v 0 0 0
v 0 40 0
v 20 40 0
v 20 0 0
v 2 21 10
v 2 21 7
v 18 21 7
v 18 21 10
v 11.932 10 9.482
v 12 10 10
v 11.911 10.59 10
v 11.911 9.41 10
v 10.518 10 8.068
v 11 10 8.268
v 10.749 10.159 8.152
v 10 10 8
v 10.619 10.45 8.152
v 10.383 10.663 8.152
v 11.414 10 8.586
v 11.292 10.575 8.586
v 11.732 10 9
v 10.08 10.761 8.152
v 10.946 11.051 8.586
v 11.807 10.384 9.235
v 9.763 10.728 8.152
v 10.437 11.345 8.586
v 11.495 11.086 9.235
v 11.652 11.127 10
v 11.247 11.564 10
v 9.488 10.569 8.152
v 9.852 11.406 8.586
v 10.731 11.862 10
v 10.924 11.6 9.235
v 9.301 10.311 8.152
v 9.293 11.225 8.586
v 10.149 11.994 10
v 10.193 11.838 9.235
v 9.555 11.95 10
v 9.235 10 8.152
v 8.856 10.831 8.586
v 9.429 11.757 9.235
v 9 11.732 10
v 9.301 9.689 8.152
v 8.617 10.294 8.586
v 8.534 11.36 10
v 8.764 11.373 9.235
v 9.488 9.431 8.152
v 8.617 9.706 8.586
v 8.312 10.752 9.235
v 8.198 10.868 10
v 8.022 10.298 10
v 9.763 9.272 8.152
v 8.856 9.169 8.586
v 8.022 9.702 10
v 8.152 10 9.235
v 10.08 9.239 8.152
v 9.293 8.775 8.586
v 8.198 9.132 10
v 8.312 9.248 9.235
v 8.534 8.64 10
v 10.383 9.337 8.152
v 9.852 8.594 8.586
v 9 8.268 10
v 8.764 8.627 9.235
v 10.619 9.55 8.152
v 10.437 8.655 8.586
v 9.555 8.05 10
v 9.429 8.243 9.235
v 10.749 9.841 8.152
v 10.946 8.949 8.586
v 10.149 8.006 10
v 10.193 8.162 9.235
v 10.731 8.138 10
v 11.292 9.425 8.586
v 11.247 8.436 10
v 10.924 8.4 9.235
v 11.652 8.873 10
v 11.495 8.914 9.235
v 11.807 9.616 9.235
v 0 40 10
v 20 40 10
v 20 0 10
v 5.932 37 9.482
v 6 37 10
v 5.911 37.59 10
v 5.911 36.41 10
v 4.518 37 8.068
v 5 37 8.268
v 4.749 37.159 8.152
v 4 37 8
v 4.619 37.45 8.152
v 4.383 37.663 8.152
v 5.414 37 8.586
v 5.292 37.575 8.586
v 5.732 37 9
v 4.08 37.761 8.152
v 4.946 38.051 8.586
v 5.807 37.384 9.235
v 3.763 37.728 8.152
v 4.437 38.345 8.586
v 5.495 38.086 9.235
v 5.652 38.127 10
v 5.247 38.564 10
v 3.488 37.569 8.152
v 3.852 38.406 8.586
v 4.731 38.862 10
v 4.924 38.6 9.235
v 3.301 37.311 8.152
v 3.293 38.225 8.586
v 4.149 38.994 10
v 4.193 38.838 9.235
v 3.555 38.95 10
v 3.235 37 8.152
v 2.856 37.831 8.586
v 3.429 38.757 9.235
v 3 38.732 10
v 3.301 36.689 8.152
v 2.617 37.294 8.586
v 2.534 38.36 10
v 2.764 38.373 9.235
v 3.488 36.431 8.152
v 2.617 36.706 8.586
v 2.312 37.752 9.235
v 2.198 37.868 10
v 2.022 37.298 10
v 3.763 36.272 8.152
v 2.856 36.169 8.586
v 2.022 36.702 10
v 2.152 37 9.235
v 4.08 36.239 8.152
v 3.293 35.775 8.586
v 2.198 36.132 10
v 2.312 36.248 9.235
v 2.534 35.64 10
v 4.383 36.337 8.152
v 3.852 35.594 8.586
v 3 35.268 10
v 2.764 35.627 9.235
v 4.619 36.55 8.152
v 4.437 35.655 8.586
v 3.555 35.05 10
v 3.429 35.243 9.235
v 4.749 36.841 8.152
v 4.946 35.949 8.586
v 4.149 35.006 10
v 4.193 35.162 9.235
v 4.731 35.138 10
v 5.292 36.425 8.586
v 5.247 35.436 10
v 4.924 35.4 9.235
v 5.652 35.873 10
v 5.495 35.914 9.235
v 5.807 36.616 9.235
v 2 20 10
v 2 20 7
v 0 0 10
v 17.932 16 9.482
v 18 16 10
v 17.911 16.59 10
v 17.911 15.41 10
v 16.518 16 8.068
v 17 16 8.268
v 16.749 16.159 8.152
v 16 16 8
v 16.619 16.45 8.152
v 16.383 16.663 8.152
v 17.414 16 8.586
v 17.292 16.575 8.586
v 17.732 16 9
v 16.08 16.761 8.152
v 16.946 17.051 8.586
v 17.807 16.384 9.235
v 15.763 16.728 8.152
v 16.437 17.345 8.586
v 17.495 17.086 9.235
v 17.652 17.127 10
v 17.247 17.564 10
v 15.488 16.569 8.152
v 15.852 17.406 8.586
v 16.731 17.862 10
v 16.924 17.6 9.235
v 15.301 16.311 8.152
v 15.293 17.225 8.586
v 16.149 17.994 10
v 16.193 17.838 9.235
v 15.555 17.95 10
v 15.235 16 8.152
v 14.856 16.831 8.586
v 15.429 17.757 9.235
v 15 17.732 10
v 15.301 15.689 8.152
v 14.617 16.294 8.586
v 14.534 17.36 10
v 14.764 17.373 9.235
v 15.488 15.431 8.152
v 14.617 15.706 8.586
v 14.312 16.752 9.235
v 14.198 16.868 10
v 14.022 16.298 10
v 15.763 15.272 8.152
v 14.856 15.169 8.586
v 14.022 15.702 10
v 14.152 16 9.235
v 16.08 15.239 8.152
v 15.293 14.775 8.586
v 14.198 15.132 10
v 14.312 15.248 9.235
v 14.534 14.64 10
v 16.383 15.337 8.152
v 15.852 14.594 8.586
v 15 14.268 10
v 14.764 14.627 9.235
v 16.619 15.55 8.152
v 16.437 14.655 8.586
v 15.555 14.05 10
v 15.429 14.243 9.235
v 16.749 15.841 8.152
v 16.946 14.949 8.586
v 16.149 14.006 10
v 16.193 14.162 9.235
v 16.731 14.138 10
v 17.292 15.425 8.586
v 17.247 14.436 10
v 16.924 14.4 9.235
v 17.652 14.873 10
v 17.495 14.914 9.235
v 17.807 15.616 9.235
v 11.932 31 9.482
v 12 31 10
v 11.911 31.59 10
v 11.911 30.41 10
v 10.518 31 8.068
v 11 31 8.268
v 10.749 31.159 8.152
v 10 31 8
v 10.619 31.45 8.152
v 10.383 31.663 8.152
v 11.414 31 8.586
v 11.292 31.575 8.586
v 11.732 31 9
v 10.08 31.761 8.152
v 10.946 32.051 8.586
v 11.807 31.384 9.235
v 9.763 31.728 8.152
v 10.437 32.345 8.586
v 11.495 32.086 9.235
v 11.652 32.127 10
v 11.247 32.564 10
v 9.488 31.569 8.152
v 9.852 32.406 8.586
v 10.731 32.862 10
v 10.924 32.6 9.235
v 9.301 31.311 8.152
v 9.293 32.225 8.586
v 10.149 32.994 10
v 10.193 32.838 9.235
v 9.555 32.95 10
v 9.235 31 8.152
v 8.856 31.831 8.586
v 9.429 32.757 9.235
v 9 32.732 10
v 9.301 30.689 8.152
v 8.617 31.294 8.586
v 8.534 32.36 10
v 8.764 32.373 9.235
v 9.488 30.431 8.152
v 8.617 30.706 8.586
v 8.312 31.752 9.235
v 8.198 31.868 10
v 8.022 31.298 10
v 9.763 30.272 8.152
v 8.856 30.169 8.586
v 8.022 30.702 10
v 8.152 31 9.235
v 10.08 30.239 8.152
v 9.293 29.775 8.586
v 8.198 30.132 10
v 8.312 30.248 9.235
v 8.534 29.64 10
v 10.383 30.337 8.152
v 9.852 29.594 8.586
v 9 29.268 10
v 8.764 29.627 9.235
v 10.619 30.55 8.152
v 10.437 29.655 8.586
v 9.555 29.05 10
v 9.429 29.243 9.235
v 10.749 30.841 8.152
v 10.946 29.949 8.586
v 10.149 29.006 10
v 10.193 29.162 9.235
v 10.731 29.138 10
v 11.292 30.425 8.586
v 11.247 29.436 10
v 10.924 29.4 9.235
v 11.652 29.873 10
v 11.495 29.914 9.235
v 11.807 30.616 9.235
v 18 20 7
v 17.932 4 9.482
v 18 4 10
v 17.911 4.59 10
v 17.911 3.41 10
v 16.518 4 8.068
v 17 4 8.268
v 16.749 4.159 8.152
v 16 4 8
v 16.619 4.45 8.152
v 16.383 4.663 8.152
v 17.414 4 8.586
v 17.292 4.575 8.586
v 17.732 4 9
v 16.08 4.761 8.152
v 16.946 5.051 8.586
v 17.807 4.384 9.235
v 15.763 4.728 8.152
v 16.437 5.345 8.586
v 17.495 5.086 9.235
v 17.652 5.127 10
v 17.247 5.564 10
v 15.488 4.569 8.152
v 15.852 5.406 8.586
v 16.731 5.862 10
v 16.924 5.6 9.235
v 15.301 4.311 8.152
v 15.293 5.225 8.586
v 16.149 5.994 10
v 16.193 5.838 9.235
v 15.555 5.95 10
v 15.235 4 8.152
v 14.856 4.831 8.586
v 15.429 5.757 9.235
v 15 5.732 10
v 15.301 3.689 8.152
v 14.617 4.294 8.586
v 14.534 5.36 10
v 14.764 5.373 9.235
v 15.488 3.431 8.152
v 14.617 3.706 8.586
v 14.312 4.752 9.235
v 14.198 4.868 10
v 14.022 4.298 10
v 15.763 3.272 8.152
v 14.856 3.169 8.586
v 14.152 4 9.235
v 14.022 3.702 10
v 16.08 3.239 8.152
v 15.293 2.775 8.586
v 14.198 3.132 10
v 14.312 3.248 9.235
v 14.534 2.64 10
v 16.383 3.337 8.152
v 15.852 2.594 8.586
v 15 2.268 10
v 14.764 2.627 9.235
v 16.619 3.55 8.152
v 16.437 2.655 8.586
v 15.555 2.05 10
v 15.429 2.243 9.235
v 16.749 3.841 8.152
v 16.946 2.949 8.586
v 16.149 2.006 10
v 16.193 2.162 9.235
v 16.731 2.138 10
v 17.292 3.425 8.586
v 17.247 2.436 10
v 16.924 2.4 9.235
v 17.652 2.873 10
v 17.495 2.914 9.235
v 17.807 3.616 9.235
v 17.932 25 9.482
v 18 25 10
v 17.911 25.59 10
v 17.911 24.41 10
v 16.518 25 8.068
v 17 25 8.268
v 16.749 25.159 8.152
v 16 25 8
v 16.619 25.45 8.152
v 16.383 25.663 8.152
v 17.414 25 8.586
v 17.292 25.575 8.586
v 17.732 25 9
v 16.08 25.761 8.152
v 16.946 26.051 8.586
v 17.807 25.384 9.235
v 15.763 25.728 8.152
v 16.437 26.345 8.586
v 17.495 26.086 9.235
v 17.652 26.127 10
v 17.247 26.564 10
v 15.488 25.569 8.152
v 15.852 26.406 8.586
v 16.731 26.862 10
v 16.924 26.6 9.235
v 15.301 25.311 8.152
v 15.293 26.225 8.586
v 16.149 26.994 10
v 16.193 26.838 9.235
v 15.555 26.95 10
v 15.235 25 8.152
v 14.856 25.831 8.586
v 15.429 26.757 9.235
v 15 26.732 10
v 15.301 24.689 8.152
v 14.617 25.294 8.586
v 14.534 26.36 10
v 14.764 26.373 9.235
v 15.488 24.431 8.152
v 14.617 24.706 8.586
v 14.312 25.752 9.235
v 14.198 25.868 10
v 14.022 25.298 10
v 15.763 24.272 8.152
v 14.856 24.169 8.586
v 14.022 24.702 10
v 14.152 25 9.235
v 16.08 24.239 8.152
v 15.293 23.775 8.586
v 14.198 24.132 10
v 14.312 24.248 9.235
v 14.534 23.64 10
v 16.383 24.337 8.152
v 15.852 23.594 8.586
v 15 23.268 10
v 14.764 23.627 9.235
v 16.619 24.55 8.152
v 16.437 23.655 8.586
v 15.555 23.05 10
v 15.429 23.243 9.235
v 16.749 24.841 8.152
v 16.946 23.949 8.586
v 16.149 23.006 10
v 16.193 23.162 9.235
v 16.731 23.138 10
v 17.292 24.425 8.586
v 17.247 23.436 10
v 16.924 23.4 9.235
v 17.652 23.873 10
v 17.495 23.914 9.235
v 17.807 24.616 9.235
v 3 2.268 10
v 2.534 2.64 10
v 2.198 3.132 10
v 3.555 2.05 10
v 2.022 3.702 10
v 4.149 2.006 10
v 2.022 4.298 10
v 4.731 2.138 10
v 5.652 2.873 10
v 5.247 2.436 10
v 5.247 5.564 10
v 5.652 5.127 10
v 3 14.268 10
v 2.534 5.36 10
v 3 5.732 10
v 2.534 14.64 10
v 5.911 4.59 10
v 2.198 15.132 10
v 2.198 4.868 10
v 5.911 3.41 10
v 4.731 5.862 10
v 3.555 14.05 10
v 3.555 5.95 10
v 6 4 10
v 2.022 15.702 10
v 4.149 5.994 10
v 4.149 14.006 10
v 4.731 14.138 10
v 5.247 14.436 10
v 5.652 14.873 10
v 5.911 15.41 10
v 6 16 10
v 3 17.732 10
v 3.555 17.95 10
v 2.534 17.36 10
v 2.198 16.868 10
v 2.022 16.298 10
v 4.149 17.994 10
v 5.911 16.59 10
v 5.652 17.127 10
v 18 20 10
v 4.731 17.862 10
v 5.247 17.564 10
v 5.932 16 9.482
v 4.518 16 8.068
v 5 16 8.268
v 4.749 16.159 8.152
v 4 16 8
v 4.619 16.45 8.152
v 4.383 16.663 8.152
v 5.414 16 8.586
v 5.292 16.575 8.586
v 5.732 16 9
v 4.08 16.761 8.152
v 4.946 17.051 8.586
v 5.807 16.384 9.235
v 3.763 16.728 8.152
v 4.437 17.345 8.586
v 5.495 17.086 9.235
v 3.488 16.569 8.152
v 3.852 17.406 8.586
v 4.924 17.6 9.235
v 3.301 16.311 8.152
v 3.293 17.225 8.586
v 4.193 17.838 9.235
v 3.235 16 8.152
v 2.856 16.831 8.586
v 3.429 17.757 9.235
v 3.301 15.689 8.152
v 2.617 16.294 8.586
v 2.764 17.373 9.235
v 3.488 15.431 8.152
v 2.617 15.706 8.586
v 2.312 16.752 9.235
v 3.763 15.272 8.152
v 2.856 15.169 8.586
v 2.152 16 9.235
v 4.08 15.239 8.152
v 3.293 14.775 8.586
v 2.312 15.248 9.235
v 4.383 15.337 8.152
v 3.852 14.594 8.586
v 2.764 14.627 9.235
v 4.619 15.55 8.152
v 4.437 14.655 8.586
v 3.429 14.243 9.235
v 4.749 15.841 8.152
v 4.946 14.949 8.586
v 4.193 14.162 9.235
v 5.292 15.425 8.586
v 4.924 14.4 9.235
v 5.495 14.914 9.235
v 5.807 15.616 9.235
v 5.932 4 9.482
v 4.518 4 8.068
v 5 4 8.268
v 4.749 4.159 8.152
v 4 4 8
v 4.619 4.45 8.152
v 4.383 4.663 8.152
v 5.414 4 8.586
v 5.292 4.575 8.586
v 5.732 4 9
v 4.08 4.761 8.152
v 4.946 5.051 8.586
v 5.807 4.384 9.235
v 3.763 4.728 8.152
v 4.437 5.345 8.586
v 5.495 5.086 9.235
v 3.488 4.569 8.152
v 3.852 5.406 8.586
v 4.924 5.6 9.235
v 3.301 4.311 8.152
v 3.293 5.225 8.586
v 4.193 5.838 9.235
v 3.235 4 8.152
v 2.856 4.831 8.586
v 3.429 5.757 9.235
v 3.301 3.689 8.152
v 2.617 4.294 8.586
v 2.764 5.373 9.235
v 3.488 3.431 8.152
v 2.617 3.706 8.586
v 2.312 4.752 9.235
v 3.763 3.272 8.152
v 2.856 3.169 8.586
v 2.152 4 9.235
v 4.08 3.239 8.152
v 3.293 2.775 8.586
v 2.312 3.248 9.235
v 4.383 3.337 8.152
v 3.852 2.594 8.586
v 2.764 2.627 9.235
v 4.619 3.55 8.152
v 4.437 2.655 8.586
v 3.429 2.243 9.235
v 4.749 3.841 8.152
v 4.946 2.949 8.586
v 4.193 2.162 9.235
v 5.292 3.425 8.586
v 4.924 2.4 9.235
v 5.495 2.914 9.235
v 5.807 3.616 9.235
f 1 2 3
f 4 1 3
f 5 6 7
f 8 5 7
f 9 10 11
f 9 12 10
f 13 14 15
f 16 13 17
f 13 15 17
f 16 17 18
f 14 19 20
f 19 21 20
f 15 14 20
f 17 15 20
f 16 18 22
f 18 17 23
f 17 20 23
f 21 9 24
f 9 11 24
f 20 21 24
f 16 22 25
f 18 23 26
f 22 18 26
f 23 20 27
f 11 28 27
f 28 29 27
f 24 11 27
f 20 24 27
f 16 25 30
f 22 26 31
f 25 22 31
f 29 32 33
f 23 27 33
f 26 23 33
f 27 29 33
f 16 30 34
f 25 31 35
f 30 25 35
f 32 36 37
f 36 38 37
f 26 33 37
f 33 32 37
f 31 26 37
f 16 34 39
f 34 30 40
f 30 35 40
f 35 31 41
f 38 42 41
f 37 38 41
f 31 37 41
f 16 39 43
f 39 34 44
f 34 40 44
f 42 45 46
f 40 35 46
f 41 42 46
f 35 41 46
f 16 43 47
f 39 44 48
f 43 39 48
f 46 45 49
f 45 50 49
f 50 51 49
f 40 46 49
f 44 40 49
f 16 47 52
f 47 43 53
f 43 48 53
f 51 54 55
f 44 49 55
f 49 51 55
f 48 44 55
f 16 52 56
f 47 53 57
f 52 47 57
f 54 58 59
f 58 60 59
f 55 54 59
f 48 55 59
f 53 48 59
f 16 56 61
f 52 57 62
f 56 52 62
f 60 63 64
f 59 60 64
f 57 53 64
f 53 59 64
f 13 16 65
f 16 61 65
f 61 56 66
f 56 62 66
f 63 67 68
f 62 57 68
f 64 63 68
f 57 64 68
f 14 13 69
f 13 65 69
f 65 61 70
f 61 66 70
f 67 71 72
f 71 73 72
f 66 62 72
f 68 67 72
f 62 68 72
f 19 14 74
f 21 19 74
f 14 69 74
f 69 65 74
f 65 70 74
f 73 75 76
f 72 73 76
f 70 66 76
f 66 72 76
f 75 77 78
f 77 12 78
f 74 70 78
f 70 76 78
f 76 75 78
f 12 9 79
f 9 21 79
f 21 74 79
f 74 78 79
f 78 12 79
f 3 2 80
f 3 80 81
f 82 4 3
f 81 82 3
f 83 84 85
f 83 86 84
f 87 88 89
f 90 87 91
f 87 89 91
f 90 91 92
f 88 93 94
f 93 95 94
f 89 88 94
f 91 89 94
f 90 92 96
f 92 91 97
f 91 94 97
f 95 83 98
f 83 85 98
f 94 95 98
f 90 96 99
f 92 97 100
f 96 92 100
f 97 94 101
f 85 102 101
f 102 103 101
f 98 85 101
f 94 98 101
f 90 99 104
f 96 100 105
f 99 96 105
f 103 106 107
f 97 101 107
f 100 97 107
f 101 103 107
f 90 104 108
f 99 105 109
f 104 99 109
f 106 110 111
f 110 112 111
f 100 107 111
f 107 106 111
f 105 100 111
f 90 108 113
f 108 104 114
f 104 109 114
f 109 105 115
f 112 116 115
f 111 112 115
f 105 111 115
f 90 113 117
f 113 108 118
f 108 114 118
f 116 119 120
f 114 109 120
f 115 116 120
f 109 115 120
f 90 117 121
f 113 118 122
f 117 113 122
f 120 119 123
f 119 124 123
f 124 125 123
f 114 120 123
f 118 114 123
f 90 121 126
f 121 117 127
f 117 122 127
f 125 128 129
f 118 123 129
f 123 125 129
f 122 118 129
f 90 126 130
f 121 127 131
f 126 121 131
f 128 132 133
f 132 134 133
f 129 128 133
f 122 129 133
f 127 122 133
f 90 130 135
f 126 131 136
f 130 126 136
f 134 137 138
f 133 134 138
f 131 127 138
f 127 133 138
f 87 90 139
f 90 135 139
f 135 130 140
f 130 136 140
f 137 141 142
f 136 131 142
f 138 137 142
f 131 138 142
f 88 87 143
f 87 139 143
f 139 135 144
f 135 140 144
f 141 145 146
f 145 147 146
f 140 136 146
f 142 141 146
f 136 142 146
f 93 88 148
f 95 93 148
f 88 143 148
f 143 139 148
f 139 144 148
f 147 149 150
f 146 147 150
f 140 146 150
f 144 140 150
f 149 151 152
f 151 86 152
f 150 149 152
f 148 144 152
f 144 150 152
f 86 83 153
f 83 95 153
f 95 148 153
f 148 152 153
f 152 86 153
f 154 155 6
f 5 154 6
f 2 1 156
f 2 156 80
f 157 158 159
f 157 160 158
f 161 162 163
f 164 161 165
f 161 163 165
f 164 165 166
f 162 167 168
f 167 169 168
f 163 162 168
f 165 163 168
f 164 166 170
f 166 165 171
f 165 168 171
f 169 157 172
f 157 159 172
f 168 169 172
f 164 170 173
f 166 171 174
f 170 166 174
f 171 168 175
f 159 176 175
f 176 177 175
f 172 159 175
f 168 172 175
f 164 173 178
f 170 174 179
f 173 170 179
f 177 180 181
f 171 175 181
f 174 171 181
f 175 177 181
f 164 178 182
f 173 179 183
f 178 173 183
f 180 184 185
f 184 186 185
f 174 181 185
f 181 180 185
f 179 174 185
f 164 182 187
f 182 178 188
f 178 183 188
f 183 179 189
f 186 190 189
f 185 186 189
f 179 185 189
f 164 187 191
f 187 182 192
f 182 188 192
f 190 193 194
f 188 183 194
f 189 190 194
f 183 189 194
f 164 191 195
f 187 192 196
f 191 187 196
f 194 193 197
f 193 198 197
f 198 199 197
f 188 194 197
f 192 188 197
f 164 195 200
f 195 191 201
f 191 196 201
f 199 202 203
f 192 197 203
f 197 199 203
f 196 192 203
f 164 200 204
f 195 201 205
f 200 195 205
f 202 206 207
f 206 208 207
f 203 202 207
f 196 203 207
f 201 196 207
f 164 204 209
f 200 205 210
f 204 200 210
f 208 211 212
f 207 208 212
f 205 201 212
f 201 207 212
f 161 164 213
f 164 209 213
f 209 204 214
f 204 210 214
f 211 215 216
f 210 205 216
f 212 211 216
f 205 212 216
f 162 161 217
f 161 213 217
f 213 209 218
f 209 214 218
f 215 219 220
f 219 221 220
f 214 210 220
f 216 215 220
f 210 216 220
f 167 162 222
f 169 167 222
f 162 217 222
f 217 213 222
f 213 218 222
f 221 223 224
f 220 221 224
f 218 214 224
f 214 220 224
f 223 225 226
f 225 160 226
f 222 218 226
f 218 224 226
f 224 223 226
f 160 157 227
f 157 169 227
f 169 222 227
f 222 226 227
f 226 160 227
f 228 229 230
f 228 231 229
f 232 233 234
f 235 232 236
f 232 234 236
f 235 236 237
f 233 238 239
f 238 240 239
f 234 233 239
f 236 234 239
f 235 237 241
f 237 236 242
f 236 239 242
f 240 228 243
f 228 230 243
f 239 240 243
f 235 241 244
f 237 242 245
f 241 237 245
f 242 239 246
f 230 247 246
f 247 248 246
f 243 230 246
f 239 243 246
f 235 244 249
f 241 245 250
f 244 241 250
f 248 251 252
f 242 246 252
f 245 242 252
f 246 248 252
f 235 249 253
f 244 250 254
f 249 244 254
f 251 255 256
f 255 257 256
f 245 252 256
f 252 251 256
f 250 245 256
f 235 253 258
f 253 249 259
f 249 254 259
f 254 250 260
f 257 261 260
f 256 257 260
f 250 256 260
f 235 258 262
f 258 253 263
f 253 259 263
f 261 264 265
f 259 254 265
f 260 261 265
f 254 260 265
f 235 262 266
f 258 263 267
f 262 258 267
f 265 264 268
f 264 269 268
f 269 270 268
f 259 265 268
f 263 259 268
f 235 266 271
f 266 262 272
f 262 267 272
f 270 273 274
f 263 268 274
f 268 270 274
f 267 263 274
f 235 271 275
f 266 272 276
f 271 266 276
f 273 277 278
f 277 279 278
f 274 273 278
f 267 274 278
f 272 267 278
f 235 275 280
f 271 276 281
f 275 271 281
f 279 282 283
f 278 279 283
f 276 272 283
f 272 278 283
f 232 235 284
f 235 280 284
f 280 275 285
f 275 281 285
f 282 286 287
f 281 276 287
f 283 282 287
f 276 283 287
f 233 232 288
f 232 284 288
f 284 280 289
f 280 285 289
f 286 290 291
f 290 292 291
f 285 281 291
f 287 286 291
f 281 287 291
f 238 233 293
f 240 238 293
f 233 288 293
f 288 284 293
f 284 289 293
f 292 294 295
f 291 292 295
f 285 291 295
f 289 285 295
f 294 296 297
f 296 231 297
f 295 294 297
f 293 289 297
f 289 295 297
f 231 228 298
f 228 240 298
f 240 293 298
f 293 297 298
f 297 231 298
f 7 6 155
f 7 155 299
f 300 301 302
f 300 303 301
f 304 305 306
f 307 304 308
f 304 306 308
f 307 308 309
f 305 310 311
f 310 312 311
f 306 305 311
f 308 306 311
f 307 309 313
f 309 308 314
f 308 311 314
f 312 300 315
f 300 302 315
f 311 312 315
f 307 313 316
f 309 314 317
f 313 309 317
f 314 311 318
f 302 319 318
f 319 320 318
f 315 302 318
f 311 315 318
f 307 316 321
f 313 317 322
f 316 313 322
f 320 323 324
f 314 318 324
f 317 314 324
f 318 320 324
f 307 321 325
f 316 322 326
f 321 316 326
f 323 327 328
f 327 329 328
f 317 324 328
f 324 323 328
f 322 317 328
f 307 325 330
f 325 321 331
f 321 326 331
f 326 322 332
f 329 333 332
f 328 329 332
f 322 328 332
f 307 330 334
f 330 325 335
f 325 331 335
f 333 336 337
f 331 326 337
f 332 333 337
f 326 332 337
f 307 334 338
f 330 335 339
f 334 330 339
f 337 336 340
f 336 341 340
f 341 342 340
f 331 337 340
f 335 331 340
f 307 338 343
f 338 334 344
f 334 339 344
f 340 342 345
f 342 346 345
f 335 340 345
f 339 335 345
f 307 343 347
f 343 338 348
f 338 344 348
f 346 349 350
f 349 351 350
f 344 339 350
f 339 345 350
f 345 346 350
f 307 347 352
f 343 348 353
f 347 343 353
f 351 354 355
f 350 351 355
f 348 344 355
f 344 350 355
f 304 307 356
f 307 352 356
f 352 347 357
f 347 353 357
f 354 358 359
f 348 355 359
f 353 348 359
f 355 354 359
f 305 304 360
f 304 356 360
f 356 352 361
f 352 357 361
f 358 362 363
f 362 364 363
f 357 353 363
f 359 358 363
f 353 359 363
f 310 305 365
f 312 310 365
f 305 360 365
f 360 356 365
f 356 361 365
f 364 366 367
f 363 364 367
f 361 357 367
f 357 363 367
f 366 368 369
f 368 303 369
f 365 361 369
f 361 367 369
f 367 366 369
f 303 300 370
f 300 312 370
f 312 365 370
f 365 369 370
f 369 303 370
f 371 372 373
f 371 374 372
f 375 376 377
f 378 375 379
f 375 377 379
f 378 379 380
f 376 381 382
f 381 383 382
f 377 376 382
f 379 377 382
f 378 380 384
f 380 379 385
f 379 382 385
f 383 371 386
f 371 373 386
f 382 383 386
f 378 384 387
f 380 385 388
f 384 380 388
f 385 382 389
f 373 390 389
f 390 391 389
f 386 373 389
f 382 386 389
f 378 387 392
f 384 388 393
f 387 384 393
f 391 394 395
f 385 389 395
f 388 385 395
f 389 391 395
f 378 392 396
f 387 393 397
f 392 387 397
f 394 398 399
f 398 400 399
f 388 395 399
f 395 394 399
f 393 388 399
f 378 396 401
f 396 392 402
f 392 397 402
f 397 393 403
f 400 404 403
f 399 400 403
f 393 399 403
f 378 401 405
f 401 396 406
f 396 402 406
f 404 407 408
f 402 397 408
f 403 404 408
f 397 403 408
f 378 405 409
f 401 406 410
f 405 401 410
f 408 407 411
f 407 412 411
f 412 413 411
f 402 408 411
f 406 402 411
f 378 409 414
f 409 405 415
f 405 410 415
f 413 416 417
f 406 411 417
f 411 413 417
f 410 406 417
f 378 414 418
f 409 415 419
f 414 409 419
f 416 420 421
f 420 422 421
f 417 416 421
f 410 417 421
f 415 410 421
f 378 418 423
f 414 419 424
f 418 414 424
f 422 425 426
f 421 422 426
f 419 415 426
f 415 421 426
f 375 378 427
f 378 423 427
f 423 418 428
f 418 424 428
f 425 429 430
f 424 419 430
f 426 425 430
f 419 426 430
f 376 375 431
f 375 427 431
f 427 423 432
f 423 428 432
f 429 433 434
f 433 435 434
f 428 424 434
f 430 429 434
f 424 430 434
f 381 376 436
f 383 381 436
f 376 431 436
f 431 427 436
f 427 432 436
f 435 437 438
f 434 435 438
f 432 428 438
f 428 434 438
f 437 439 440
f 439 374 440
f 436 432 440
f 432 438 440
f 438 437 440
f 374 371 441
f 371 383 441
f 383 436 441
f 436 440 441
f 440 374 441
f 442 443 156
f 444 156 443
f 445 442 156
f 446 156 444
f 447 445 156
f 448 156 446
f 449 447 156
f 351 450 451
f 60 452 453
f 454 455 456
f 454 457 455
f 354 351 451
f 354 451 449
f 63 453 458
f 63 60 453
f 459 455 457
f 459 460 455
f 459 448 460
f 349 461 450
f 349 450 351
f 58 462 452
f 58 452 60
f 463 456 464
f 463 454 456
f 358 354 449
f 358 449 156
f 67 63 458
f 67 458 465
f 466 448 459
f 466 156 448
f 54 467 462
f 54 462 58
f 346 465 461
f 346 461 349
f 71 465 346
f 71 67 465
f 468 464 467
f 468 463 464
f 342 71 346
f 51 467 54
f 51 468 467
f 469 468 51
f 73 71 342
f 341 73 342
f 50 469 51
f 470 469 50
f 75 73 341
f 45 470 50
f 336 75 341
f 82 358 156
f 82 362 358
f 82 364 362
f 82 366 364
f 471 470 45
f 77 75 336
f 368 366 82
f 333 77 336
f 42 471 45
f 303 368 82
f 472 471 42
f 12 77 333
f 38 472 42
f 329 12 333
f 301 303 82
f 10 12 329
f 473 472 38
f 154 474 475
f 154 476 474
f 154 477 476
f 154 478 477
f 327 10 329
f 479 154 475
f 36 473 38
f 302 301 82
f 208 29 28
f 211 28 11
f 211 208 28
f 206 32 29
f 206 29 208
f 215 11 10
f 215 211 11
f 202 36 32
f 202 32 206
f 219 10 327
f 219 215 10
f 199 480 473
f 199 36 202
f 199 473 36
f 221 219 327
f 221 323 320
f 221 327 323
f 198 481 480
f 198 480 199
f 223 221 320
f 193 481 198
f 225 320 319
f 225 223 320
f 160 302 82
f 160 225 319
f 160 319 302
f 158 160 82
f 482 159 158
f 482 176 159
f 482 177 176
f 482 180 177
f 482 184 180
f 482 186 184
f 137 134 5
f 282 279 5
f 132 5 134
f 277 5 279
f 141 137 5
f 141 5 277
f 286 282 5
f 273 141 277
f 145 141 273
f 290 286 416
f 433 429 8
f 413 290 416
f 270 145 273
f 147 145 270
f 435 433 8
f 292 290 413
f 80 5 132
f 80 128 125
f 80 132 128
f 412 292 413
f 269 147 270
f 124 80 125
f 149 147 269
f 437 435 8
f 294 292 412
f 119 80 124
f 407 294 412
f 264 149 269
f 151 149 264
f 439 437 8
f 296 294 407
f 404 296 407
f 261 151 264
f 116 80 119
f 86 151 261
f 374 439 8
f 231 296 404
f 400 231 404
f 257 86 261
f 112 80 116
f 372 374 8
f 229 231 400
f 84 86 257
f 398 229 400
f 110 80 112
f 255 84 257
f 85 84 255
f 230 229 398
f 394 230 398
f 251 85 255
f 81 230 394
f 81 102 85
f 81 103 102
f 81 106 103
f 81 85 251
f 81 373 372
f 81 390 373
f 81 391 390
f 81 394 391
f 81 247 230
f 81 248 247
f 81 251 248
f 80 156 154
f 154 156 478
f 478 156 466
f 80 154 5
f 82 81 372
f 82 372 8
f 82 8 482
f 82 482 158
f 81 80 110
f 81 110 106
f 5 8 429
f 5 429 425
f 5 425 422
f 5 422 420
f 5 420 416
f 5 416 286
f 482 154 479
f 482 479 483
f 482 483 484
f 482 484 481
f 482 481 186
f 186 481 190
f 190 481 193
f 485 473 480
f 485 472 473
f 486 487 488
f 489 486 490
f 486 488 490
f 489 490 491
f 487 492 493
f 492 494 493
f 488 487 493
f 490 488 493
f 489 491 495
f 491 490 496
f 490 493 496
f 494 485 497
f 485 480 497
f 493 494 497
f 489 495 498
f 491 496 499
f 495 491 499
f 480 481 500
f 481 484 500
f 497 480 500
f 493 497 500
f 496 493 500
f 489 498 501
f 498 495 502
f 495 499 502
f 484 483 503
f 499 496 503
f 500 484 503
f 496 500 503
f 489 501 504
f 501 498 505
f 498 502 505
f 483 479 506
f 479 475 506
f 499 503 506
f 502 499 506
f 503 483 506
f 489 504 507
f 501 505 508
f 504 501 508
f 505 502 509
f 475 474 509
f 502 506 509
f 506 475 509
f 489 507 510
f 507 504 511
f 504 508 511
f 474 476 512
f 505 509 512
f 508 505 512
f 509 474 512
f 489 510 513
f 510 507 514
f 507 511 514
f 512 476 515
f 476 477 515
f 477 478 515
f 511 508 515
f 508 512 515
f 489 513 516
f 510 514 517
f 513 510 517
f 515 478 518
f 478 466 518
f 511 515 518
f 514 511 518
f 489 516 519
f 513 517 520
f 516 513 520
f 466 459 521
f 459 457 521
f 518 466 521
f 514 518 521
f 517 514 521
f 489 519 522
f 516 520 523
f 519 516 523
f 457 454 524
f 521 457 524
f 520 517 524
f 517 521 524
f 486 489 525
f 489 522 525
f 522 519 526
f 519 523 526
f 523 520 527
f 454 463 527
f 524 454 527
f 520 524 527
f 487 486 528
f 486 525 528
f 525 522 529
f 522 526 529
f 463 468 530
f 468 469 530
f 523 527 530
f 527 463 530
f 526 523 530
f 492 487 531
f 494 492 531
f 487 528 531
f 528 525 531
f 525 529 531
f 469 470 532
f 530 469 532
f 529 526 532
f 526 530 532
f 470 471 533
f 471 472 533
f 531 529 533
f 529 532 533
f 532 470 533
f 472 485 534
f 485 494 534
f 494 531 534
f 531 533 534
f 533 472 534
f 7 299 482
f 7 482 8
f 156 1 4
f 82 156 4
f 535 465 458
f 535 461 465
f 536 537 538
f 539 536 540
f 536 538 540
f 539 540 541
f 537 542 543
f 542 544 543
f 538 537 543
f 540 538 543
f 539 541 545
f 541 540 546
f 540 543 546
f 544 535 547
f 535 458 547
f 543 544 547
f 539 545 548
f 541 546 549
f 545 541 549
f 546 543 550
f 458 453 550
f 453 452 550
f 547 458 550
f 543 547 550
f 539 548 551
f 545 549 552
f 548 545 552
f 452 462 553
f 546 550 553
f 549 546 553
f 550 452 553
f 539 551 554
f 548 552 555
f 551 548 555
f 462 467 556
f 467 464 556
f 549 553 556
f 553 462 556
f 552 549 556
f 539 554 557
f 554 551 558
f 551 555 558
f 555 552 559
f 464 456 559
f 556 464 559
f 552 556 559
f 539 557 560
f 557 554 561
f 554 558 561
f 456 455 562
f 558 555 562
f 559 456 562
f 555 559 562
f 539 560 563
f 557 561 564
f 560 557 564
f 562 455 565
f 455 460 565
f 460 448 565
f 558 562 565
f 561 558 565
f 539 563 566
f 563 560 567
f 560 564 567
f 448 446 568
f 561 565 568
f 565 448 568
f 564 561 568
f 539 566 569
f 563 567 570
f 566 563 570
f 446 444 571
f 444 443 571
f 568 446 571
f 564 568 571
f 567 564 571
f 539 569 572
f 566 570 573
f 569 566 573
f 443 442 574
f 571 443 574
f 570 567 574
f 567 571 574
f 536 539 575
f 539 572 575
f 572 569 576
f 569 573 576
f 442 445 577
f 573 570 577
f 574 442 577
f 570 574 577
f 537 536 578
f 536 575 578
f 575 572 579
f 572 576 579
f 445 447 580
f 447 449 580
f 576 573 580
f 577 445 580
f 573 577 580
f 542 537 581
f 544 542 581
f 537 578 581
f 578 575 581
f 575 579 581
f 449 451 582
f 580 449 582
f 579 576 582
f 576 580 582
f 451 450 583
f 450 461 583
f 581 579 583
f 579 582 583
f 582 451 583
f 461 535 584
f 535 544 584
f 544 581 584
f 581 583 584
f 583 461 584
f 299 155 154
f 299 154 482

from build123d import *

# Parameters (mm, degrees)
ARRAY_X_COUNT    = 3
ARRAY_X_PITCH    = 8.485281
ARRAY001_X_COUNT = 2
ARRAY001_X_PITCH = 12
ARRAY001_Y_COUNT = 2
ARRAY001_Y_PITCH = 12
BOX001_W         = 16
BOX001_H         = 1
BOX001_DEPTH     = 4
BOX_W            = 20
BOX_H            = 40
BOX_DEPTH        = 10


with BuildPart() as numero3:
    # Sphere → Sphere (revolve)
    with BuildSketch(Plane(origin=(4, 37, 10), x_dir=(1, 0, 0), z_dir=(0, -1, 0))):
        with BuildLine():
            ThreePointArc((0, -2), (2, 0), (0, 2))
            Line((0, 2), (0, -2))
        make_face()
    revolve(axis=Axis((4, 37, 10), (0, 0, 1)))

    # Array X: numero3 ×3


with BuildPart() as numero3_1:
    add(numero3.part)
    with Locations(*[Vector(0.707107, -0.707107, 0) * (i * ARRAY_X_PITCH) for i in range(1, ARRAY_X_COUNT)]):
        add(numero3.part)


with BuildPart() as array001:
    # Sphere001 → Sphere001 (revolve)
    with BuildSketch(Plane.XZ):
        with BuildLine():
            ThreePointArc((0, -2), (2, 0), (0, 2))
            Line((0, 2), (0, -2))
        make_face()
    revolve(axis=Axis((0, 0, 0), (0, 0, 1)))

    # Array001 X: Array001 ×2


with BuildPart() as array001_1:
    add(array001.part)
    with Locations(*[(i * ARRAY001_X_PITCH, 0, 0) for i in range(1, ARRAY001_X_COUNT)]):
        add(array001.part)

    # Array001 Y: Array001 ×2


with BuildPart() as array001_2:
    add(array001_1.part)
    with Locations(*[(0, i * ARRAY001_Y_PITCH, 0) for i in range(1, ARRAY001_Y_COUNT)]):
        add(array001_1.part)


with BuildPart() as array001_3:
    # Array001 placement: moved
    add(array001_2.part.moved(Location((4, 4, 10))))


with BuildPart() as sphere002:
    # Sphere002 → Sphere002 (revolve)
    with BuildSketch(Plane(origin=(10, 10, 10), x_dir=(1, 0, 0), z_dir=(0, -1, 0))):
        with BuildLine():
            ThreePointArc((0, -2), (2, 0), (0, 2))
            Line((0, 2), (0, -2))
        make_face()
    revolve(axis=Axis((10, 10, 10), (0, 0, 1)))


with BuildPart() as cube:
    # Box001 → Box001 (new body)
    with BuildSketch(Plane(origin=(2, 20, 7), x_dir=(1, 0, 0), z_dir=(0, 0, 1))):
        with Locations((8, 0.5)):
            Rectangle(BOX001_W, BOX001_H)
    extrude(amount=BOX001_DEPTH)


with BuildPart() as cut003:
    # Box → Box (new body)
    with BuildSketch(Plane.XY):
        with Locations((10, 20)):
            Rectangle(BOX_W, BOX_H)
    extrude(amount=BOX_DEPTH)

    # Cut: cut Cube
    add(cube.part, mode=Mode.SUBTRACT)

    # Cut001: cut Sphere002
    add(sphere002.part, mode=Mode.SUBTRACT)

    # Cut002: cut Array001
    add(array001_3.part, mode=Mode.SUBTRACT)

    # Cut003: cut numero3
    add(numero3_1.part, mode=Mode.SUBTRACT)


solid = cut003.part
